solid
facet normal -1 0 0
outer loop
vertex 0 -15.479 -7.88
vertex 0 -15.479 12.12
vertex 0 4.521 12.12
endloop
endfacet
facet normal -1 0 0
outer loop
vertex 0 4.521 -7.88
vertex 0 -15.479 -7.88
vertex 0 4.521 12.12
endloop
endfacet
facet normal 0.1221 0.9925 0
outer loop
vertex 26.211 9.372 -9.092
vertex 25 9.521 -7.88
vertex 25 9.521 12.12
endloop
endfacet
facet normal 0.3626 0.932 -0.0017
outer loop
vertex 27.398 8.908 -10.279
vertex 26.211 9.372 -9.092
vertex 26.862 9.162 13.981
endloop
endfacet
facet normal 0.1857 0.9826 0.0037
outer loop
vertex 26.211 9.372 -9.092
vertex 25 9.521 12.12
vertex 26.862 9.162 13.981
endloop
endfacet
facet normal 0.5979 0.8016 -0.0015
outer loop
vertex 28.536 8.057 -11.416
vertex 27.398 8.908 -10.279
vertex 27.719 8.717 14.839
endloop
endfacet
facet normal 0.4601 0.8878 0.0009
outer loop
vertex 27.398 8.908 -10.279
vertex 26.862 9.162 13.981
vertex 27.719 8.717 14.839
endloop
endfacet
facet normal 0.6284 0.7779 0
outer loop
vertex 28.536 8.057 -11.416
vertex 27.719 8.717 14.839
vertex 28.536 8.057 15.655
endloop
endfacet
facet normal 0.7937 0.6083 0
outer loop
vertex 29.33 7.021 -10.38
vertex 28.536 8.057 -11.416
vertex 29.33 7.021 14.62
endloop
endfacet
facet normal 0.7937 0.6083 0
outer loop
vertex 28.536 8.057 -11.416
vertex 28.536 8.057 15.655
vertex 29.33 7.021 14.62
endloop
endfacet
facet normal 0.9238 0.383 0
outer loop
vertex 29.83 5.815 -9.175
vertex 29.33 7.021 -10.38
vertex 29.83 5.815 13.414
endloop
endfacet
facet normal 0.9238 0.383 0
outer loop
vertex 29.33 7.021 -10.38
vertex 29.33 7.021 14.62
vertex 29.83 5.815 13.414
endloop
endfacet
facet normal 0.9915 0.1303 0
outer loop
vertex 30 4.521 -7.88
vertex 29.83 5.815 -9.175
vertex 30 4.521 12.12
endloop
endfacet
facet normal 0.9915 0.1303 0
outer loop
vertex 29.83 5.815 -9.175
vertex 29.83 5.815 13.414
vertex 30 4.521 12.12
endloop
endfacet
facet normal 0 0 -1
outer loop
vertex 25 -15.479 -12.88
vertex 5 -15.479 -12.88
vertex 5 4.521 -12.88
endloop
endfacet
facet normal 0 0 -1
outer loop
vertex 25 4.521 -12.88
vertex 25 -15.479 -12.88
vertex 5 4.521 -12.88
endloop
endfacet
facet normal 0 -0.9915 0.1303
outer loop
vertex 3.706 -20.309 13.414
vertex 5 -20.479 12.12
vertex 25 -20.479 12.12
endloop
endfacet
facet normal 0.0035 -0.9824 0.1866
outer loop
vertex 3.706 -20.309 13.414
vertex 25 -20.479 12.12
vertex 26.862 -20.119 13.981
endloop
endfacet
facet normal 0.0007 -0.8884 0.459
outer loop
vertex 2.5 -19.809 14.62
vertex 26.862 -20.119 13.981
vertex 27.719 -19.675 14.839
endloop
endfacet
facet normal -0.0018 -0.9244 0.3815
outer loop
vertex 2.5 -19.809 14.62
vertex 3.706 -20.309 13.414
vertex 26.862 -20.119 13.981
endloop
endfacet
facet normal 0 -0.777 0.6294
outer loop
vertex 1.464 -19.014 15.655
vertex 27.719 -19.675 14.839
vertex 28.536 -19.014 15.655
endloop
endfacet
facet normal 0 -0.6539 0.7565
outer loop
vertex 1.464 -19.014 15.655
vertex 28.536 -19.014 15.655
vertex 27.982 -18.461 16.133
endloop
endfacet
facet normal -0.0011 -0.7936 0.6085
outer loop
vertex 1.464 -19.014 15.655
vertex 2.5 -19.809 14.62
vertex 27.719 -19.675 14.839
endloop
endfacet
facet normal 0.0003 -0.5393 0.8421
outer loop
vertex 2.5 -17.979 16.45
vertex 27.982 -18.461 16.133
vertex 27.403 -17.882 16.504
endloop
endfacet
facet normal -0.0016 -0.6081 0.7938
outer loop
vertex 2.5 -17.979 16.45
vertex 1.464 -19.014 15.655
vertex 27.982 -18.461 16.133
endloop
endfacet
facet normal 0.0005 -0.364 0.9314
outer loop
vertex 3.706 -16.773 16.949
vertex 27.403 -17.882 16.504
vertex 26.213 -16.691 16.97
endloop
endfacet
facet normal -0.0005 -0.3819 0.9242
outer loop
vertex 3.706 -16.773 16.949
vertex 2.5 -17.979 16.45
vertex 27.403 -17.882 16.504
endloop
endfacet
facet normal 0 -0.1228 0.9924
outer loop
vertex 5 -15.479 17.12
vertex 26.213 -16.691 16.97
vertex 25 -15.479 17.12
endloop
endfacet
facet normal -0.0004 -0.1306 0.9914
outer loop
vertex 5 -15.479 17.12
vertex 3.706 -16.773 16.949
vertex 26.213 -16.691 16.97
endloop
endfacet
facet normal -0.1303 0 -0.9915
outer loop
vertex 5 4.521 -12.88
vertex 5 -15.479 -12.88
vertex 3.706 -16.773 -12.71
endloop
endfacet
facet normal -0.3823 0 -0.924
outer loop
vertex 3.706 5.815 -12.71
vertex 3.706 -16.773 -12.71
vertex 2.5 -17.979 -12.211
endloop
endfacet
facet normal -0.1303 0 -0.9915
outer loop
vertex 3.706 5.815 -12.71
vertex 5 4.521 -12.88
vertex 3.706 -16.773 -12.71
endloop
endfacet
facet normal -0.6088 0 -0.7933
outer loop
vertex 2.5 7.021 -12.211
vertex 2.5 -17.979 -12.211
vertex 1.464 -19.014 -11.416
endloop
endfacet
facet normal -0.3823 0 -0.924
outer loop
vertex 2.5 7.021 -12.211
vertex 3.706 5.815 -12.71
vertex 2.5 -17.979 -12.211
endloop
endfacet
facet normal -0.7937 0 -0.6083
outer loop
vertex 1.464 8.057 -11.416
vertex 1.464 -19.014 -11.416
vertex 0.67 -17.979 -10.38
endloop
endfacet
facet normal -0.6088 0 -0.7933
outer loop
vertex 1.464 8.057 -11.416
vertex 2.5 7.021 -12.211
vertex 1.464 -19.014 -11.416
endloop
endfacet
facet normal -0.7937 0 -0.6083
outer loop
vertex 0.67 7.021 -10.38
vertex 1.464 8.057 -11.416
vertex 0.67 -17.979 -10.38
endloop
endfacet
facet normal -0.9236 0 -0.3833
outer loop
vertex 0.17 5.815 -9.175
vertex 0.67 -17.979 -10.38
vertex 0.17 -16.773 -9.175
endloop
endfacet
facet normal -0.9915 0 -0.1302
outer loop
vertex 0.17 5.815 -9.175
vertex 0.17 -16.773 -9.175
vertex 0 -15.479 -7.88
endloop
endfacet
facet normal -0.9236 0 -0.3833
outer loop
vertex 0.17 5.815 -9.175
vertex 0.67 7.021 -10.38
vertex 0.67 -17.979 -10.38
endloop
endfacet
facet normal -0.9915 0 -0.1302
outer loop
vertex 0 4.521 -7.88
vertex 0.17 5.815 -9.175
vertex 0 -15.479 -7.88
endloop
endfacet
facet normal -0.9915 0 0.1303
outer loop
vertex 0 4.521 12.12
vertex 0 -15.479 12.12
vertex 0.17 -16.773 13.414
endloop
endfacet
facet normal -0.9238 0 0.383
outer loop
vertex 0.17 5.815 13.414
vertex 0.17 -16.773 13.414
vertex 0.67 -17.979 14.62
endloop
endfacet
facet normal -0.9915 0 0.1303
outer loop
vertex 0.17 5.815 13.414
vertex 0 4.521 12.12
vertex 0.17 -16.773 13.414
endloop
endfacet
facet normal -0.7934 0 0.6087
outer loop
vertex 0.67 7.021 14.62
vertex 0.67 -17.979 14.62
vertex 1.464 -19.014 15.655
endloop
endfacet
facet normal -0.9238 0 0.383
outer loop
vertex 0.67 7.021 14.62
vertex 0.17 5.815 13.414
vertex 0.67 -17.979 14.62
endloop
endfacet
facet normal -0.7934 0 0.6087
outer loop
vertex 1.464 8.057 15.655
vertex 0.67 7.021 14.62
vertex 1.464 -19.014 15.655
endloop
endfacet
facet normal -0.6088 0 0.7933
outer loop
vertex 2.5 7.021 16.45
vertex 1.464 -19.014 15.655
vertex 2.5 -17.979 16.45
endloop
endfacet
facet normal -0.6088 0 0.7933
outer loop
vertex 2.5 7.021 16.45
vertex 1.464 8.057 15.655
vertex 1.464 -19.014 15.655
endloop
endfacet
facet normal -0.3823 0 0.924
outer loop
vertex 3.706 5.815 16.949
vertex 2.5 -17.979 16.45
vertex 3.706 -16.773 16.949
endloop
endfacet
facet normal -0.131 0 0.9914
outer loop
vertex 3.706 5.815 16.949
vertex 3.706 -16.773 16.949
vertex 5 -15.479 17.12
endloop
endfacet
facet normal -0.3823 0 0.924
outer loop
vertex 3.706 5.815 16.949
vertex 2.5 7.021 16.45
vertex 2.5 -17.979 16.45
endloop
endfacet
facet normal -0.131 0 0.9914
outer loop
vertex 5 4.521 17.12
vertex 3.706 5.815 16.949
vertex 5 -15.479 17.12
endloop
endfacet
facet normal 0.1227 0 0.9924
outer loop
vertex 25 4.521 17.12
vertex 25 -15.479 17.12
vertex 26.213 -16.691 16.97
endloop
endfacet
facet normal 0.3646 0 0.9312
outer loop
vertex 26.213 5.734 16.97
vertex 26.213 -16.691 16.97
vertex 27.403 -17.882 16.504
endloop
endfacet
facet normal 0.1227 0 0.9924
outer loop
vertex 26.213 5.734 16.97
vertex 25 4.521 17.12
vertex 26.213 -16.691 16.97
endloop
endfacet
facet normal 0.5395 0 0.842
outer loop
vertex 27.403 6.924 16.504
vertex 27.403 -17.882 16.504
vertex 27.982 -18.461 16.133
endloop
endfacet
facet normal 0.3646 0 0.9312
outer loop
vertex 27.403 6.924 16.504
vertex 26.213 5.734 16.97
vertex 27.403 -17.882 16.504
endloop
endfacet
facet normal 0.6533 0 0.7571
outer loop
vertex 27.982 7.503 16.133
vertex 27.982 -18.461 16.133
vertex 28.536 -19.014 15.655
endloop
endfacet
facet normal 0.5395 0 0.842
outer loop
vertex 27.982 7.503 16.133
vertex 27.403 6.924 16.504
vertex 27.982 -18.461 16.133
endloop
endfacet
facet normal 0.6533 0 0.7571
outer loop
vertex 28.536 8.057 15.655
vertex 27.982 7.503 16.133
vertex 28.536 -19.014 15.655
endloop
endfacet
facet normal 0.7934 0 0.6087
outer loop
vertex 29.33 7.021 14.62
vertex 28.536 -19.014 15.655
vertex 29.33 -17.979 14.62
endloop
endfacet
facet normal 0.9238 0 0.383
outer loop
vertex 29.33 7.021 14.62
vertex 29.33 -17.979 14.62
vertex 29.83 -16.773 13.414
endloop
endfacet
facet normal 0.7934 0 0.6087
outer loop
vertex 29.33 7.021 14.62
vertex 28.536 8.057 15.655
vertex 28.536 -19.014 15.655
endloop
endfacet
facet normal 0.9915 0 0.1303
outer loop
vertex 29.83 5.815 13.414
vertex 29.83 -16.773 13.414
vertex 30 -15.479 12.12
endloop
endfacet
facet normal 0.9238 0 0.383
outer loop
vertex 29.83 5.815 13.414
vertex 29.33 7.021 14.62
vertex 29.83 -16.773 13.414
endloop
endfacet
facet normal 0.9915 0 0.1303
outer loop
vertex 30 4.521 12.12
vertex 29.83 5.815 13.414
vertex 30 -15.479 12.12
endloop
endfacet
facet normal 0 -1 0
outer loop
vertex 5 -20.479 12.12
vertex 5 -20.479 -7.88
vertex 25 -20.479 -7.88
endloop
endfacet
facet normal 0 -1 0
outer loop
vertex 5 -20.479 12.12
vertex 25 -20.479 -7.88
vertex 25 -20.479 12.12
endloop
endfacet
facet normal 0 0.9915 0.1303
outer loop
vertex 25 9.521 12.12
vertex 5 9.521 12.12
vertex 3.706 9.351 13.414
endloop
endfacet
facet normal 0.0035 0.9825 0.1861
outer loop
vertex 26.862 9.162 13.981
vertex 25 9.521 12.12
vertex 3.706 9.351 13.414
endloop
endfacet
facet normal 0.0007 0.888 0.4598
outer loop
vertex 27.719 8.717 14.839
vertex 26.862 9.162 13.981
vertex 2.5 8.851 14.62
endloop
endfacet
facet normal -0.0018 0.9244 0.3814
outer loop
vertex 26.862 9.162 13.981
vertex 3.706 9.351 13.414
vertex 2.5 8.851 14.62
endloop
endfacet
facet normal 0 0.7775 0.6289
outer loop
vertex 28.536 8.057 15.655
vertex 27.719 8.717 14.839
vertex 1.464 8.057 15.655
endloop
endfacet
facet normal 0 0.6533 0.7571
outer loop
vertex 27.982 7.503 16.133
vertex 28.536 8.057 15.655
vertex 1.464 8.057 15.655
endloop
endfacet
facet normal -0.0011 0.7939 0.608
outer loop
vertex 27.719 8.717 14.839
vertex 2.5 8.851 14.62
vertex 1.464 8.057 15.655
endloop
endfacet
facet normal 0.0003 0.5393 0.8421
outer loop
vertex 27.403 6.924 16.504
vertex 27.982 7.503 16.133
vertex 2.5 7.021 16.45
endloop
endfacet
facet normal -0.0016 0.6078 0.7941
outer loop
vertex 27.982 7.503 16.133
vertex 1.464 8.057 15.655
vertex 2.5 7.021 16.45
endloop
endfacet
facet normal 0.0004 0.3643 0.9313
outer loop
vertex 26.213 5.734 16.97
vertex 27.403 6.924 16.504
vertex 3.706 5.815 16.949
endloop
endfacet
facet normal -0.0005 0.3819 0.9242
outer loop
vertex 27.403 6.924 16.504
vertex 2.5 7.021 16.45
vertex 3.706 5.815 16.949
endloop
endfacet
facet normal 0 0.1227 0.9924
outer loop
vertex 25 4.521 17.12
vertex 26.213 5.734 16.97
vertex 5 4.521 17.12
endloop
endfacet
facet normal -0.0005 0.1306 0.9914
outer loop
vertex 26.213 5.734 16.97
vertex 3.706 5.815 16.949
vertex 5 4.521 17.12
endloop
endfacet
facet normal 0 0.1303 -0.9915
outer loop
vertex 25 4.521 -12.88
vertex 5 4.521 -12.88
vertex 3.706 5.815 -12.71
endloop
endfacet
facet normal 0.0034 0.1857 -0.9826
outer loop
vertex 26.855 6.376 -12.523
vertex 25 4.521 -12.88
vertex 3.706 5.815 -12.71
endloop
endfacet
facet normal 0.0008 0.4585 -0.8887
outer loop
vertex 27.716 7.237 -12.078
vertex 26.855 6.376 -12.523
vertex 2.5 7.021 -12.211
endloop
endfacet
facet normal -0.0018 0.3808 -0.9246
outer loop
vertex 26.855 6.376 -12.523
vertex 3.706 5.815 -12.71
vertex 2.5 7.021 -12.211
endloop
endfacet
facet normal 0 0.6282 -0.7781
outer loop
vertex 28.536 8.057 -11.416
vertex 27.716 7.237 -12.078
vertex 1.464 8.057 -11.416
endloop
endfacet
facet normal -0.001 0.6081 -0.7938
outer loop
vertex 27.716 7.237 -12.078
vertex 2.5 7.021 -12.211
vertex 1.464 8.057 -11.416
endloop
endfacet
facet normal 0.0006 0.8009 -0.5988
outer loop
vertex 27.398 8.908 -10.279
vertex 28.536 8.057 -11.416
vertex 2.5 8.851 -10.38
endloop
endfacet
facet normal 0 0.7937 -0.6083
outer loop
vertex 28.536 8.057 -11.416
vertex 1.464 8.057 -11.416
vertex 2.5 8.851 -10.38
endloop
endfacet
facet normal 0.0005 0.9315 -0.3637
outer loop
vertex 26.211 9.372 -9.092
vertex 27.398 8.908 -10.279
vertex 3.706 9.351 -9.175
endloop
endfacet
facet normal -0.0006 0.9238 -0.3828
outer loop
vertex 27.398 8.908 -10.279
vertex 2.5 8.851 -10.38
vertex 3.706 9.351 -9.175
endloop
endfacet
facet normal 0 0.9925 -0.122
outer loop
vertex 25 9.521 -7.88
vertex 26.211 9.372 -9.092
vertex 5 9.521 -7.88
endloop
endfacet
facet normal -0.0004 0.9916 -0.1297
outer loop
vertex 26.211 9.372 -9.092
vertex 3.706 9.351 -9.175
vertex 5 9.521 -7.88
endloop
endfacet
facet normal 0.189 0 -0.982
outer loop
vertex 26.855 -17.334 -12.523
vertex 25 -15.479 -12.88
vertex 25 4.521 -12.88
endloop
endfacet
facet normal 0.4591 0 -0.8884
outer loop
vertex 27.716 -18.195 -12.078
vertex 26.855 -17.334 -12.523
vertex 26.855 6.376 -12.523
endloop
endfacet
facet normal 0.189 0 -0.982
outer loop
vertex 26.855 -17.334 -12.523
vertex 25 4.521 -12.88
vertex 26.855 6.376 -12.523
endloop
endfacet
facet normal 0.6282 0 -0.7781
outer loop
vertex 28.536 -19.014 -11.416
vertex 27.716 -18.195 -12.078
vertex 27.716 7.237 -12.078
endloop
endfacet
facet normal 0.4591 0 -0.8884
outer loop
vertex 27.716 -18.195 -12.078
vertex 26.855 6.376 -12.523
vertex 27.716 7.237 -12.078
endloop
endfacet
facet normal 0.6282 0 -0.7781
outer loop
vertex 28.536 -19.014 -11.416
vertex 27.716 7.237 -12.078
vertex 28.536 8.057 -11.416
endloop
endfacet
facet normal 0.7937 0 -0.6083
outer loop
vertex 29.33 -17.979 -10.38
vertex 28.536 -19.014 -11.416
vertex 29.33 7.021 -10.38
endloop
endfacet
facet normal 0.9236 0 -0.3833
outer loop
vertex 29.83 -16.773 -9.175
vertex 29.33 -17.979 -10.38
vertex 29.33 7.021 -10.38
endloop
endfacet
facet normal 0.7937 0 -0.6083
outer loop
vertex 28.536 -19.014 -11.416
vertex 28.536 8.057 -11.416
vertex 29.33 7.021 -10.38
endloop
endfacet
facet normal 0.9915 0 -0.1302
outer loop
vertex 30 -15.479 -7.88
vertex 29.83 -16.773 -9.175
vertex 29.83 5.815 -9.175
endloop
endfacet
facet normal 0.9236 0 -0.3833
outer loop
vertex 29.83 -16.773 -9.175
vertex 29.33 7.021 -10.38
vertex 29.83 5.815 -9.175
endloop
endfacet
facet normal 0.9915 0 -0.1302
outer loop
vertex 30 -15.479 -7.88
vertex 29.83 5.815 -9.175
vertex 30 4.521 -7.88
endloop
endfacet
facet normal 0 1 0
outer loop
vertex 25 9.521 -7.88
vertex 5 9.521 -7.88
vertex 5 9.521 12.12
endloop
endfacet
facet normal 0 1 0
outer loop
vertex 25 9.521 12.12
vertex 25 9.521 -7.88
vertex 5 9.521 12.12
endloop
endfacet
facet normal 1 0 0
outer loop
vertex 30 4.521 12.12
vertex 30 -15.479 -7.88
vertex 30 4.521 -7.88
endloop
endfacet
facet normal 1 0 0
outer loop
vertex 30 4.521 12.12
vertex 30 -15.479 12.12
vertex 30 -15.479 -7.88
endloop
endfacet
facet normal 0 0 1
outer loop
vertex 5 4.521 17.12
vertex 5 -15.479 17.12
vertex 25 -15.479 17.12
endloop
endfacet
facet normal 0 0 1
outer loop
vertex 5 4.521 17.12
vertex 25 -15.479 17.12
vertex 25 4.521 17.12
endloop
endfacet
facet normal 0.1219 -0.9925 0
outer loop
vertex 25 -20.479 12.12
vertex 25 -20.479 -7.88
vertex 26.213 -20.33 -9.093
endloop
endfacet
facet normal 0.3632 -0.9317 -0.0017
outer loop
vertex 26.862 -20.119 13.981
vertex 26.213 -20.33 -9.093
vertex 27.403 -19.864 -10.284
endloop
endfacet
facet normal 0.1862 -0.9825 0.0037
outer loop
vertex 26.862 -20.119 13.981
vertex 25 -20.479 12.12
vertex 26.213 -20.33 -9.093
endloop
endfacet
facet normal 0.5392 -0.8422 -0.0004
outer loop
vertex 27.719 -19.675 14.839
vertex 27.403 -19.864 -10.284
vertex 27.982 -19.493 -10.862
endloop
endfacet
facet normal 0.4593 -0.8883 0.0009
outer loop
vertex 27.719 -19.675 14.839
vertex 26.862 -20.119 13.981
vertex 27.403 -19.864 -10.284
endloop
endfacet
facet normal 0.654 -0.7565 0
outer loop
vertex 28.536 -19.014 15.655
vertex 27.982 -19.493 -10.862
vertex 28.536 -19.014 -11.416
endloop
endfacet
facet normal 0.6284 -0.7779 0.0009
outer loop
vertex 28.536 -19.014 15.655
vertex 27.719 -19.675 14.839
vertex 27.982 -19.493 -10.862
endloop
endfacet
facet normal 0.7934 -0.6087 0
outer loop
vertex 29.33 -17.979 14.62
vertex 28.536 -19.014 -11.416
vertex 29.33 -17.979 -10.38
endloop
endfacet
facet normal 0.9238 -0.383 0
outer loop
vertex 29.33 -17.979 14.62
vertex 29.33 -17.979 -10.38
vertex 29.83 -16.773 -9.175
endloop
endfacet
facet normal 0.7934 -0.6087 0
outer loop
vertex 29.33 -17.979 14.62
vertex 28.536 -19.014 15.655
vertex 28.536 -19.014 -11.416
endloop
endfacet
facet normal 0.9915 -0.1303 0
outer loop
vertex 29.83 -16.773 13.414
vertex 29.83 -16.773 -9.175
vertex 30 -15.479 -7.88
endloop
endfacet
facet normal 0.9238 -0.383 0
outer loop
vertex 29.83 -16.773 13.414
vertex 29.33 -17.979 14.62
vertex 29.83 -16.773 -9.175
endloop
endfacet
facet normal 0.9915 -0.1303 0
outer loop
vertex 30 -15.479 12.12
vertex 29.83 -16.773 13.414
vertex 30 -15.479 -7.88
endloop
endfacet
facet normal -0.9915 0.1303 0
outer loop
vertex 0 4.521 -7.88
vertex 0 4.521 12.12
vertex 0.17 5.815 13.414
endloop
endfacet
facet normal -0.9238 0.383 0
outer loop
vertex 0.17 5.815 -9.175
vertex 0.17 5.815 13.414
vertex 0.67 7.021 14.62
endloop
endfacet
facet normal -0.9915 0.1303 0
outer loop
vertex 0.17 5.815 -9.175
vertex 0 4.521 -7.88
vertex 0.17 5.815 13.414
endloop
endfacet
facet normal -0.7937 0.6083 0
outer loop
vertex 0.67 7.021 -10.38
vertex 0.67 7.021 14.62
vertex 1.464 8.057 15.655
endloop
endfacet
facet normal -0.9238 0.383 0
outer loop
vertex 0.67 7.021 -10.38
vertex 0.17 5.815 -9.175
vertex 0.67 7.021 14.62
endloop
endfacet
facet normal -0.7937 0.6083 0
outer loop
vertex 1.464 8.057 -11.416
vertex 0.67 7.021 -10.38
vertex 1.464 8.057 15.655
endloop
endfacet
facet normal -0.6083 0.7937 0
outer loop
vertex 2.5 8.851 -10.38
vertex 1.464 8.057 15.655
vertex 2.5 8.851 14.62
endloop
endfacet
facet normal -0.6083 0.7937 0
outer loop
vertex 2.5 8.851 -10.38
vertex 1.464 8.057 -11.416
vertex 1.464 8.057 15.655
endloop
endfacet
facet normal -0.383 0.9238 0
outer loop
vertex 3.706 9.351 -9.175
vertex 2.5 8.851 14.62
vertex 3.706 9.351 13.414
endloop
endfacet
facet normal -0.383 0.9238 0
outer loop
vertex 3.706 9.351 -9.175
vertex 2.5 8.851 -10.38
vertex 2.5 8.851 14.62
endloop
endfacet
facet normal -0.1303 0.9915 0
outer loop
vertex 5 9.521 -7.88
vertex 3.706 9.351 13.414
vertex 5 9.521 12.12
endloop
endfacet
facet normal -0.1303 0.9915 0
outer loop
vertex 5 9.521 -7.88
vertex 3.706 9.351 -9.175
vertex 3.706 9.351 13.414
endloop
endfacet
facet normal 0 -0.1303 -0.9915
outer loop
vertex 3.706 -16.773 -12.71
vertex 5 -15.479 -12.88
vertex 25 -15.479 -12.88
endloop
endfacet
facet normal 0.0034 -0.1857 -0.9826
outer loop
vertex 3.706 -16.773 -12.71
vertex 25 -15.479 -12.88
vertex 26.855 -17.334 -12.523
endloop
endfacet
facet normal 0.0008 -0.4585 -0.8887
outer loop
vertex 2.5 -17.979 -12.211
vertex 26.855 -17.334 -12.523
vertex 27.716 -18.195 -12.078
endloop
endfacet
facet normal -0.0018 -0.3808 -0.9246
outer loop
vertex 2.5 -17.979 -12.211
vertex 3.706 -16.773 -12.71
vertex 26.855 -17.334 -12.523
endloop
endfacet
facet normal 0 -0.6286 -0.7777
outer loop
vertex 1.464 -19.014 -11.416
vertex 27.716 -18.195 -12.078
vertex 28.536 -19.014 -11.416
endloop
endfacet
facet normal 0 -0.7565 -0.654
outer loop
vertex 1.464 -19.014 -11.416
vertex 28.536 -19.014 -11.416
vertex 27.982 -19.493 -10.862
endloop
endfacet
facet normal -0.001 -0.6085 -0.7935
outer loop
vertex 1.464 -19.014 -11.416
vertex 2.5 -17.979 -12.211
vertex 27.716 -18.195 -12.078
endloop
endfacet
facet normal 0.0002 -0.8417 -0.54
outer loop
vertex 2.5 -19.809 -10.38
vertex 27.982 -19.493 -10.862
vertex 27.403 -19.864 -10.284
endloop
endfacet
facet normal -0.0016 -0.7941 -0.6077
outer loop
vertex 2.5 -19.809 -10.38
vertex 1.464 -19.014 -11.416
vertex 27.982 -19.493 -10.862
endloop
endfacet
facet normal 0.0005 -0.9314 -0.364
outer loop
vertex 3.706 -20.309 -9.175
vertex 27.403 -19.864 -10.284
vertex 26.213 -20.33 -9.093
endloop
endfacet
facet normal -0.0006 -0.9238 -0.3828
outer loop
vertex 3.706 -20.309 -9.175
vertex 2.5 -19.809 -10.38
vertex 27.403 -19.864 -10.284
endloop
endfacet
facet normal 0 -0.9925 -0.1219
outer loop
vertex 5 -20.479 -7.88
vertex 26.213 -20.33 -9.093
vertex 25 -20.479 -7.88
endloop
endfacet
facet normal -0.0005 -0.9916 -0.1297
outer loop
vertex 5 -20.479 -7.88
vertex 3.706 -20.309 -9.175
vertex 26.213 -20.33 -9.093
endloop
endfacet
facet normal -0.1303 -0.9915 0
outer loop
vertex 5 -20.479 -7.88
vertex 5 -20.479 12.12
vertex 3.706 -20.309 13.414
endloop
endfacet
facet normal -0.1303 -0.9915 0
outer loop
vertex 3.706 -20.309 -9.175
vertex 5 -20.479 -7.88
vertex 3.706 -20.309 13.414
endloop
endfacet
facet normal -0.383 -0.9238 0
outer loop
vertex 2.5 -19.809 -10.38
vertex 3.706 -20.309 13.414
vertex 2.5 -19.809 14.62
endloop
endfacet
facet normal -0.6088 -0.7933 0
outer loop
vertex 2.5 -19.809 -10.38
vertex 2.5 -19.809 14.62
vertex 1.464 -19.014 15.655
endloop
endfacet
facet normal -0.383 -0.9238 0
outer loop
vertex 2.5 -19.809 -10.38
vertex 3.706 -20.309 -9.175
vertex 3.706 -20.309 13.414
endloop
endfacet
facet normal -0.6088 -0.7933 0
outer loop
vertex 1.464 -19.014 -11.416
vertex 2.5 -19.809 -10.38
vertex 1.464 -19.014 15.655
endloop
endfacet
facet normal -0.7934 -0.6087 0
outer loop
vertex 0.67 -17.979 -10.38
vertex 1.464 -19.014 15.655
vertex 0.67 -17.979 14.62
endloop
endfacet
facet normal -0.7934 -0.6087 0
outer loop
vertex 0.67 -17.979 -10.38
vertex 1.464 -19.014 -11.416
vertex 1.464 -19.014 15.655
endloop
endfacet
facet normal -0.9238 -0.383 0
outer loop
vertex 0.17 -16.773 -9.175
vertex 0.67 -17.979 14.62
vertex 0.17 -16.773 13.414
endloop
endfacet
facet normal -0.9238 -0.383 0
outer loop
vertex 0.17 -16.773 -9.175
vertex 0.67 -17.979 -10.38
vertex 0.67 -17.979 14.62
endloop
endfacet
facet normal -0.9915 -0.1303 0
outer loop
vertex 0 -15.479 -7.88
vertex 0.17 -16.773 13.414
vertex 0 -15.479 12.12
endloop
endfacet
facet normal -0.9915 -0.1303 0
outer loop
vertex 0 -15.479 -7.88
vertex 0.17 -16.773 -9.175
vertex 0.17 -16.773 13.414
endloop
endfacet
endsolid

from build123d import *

# Parameters (mm, degrees)
F0_W        = 30
F0_H        = 30
F1_DEPTH    = 30
F2_R        = 5
F3_T1_DEPTH = 50
F3_T3_DEPTH = 55
F4_T1_DEPTH = 50
F4_T3_DEPTH = 55
F6_T1_DEPTH = 45


# Not quite as in the source:
# - a fillet or chamfer that OpenCascade refuses, or shapes differently, is made with other operations: its cross-section is extruded or revolved along the edge and cut away or added
# - a feature of the source that left no trace in its solid (it failed there, or was rolled back) is left out


with BuildPart() as f1:
    # F0 (on Right) → F1 (new body)
    with BuildSketch(Plane.YZ):
        with Locations((-5.478883007, 2.1195821464)):
            Rectangle(F0_W, F0_H)
    extrude(amount=F1_DEPTH)

    # F2
    f2_edges = [f1.edges().sort_by_distance(p)[0] for p in [
        (30, -5.478883, -12.880418),
        (30, 9.521117, 2.119582),
        (30, -5.478883, 17.119582),
        (30, -20.478883, 2.119582),
    ]]
    fillet(f2_edges, radius=F2_R)

    # F3: fillet of radius 5 on 4 edges, made by hand

    # F3_s2 → F3_t1 (cut)
    with BuildSketch(Plane.YZ.offset(-12.5)):
        with BuildLine():
            ThreePointArc((4.521116993, -12.8804178536), (8.0566508989, -11.4159517595), (9.521116993, -7.8804178536))
            Line((9.521116993, -7.8804178536), (9.521116993, -12.8804178536))
            Line((9.521116993, -12.8804178536), (4.521116993, -12.8804178536))
        make_face()
        with BuildLine():
            ThreePointArc((9.521116993, 12.1195821464), (8.0566508989, 15.6551160523), (4.521116993, 17.1195821464))
            Line((4.521116993, 17.1195821464), (9.521116993, 17.1195821464))
            Line((9.521116993, 17.1195821464), (9.521116993, 12.1195821464))
        make_face()
    extrude(amount=F3_T1_DEPTH, mode=Mode.SUBTRACT)

    # F3_s4 → F3_t3 (cut)
    with BuildSketch(Plane.XY.offset(-25.3804178536)):
        with BuildLine():
            ThreePointArc((0, 4.521116993), (1.4644660941, 8.0566508989), (5, 9.521116993))
            Line((5, 9.521116993), (0, 9.521116993))
            Line((0, 9.521116993), (0, 4.521116993))
        make_face()
    extrude(amount=F3_T3_DEPTH, mode=Mode.SUBTRACT)

    # F4: fillet of radius 5 on 4 edges, made by hand

    # F4_s2 → F4_t1 (cut)
    with BuildSketch(Plane.YZ.offset(-12.5)):
        with BuildLine():
            ThreePointArc((-20.478883007, 12.1195821464), (-19.0144169129, 15.6551160523), (-15.478883007, 17.1195821464))
            Line((-15.478883007, 17.1195821464), (-20.478883007, 17.1195821464))
            Line((-20.478883007, 17.1195821464), (-20.478883007, 12.1195821464))
        make_face()
        with BuildLine():
            ThreePointArc((-15.478883007, -12.8804178536), (-19.0144169129, -11.4159517595), (-20.478883007, -7.8804178536))
            Line((-20.478883007, -7.8804178536), (-20.478883007, -12.8804178536))
            Line((-20.478883007, -12.8804178536), (-15.478883007, -12.8804178536))
        make_face()
    extrude(amount=F4_T1_DEPTH, mode=Mode.SUBTRACT)

    # F4_s4 → F4_t3 (cut)
    with BuildSketch(Plane.XY.offset(-25.3804178536)):
        with BuildLine():
            ThreePointArc((5, -20.478883007), (1.4644660941, -19.0144169129), (0, -15.478883007))
            Line((0, -15.478883007), (0, -20.478883007))
            Line((0, -20.478883007), (5, -20.478883007))
        make_face()
    extrude(amount=F4_T3_DEPTH, mode=Mode.SUBTRACT)

    # F6: fillet of radius 5 on 4 edges, made by hand

    # F6_s2 → F6_t1 (cut)
    with BuildSketch(Plane.XZ.offset(-17.021116993)):
        with BuildLine():
            ThreePointArc((5, -12.8804178536), (1.4644660941, -11.4159517595), (0, -7.8804178536))
            Line((0, -7.8804178536), (0, -12.8804178536))
            Line((0, -12.8804178536), (5, -12.8804178536))
        make_face()
        with BuildLine():
            ThreePointArc((0, 12.1195821464), (1.4644660941, 15.6551160523), (5, 17.1195821464))
            Line((5, 17.1195821464), (0, 17.1195821464))
            Line((0, 17.1195821464), (0, 12.1195821464))
        make_face()
    extrude(amount=F6_T1_DEPTH, mode=Mode.SUBTRACT)


solid = f1.part
